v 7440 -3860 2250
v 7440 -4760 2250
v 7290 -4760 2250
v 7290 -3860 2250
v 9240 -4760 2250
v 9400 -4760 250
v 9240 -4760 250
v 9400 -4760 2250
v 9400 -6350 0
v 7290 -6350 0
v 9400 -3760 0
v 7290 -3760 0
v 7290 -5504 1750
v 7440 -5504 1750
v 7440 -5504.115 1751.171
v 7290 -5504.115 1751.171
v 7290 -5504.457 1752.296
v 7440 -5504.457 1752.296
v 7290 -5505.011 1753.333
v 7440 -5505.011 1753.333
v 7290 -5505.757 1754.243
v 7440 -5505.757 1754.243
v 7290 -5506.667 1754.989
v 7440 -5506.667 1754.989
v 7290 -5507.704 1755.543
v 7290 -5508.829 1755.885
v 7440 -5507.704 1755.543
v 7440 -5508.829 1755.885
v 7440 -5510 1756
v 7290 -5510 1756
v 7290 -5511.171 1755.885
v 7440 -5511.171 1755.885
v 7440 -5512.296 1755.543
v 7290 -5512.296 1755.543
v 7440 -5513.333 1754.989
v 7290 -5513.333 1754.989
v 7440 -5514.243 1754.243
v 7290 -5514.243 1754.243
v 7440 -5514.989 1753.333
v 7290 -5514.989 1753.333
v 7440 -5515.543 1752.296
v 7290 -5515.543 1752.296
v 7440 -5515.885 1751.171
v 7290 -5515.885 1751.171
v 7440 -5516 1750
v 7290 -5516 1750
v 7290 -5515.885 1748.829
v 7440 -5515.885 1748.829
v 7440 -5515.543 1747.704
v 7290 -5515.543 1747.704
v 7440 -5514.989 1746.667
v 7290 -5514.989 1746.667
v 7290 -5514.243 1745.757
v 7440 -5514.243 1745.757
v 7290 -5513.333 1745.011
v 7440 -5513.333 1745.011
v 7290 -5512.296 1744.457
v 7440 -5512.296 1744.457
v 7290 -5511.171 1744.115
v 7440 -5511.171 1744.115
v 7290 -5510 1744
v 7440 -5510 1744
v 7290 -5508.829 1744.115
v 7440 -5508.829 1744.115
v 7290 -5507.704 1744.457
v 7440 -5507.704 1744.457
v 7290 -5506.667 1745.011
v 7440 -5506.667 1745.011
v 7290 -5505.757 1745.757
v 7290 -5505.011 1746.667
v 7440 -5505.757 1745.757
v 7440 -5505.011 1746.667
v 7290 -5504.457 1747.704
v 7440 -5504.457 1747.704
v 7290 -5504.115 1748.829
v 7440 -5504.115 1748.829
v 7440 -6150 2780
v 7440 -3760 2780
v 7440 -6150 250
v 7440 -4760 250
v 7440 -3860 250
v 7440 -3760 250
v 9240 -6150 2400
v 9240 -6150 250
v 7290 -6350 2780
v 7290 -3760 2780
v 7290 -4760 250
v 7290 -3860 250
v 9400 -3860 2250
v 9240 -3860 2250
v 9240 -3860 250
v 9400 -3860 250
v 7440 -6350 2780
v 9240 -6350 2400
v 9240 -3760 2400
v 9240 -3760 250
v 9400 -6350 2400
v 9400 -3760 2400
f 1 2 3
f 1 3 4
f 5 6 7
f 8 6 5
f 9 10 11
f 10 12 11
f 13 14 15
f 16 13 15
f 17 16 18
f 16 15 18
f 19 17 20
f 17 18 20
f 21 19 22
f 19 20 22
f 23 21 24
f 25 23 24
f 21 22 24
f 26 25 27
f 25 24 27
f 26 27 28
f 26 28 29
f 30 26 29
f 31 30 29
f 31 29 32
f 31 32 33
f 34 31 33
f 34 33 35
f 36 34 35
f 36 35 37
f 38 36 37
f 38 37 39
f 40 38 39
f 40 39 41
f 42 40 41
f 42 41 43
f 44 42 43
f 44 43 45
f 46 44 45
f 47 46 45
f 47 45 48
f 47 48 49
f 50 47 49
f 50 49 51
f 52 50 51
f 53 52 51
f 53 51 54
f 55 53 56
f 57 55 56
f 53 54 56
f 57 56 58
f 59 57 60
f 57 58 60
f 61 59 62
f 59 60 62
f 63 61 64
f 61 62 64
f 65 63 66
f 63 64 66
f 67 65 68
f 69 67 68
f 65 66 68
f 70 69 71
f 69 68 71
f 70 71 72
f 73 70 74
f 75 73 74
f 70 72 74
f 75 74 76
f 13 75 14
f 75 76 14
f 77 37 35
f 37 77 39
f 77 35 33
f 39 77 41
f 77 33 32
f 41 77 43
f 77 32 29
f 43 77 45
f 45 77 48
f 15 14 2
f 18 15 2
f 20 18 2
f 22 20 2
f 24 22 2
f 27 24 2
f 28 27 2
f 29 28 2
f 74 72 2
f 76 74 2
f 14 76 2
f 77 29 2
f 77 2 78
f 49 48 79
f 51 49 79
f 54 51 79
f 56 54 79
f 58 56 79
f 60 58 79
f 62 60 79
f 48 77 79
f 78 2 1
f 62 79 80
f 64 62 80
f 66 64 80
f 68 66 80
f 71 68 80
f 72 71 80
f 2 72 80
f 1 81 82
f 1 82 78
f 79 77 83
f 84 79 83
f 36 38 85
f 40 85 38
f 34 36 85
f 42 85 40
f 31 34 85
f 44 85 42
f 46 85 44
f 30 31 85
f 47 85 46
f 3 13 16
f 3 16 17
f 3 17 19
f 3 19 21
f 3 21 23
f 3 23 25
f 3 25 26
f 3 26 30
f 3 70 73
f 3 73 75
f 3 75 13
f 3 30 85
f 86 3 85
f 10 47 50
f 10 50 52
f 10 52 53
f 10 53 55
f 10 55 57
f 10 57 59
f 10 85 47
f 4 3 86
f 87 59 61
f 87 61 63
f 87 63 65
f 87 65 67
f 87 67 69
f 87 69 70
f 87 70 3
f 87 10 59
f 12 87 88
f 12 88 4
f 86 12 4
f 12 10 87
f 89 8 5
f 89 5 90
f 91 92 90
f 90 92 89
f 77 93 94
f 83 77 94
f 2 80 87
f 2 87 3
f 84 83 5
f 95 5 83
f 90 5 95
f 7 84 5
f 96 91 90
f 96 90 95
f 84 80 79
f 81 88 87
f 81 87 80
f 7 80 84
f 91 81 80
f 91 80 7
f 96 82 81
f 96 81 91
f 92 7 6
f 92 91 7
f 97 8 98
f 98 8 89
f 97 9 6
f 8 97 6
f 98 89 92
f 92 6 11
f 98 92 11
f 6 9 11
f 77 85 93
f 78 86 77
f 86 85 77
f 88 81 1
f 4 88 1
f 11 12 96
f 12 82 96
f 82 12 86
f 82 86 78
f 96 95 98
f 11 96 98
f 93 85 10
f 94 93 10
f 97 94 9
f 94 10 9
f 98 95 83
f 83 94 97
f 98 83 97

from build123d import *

# Parameters (mm, degrees)
F0_W      = 2400
F0_H      = 1000
F1_DEPTH  = 250
F2_W      = 1800
F2_H      = 2390
F3_DEPTH  = 2320
F4_W      = 900
F4_H      = 2000
F5_DEPTH  = 9400.001
F6_W      = 1000
F6_H      = 1400
F6_W_2    = 900
F6_H_2    = 400
F7_DEPTH  = 6050
F8_W      = 920
F8_H      = 920
F8_W_2    = 1000
F9_DEPTH  = 200
F10_W     = 1000
F10_H     = 1500
F11_DEPTH = 200
F12_W     = 150
F12_H     = 2660
F13_DEPTH = 280
F15_DEPTH = 950
F17_DEPTH = 50
F19_DEPTH = 2320
F21_DEPTH = 3760.001
F22_R     = 30
F23_DEPTH = 250.001
F24_W     = 1020
F24_H     = 1020
F24_W_2   = 1100
F25_DEPTH = 50
F27_DEPTH = 2570.001
F28_W     = 2110
F28_H     = 2740
F28_W_2   = 1800
F28_H_2   = 2390
F29_DEPTH = 210
F31_DEPTH = 2740
F32_W     = 3974.900246
F32_H     = 3156.905889
F32_W_2   = 2110
F32_H_2   = 2590
F33_DEPTH = 2780.001
F34_R     = 6
F35_DEPTH = 300


with BuildPart() as f1:
    # F0 (on Top) → F1 (new body)
    with BuildSketch(Plane.XY):
        Polygon((10600, 0), (0, 0), (0, -6350), (9400, -6350), (9400, -5300), (10600, -5300), align=None)
        with Locations((5100, -5650)):
            Rectangle(F0_W, F0_H, mode=Mode.SUBTRACT)
    extrude(amount=F1_DEPTH)

    # F2 (on face) → F3 (join)
    with BuildSketch(Plane.XY.offset(250)):
        Polygon((10600, 0), (0, 0), (0, -6350), (9400, -6350), (9400, -3760), (10600, -3760), align=None)
        with Locations((8340, -4955)):
            Rectangle(F2_W, F2_H, mode=Mode.SUBTRACT)
        Polygon((200, -6150), (200, -200), (3750, -200), (3750, -300), (3900, -300), (3900, -280), (4800, -280), (4800, -1180), (4950, -1180), (4950, -400), (5250, -400), (5250, -200), (7290, -200), (7290, -300), (7440, -300), (10400, -300), (10400, -3610), (7440, -3610), (7440, -2960), (7290, -2960), (7290, -6150), (3900, -6150), (3900, -5050), (3750, -5050), (3750, -6150), align=None, mode=Mode.SUBTRACT)
    extrude(amount=F3_DEPTH)

    # F4 (on face) → F5 (cut, through all)
    with BuildSketch(Plane.YZ.offset(9400)):
        with Locations((-4310, 1250)):
            Rectangle(F4_W, F4_H)
    extrude(amount=-F5_DEPTH, mode=Mode.SUBTRACT)

    # F6 (on face) → F7 (cut, through all)
    with BuildSketch(Plane.XZ.offset(6350)):
        with Locations((6740, 1500)):
            Rectangle(F6_W, F6_H)
        with Locations((3100, 1500)):
            Rectangle(F6_W, F6_H)
        with Locations((9900, 2000)):
            Rectangle(F6_W_2, F6_H_2)
    extrude(amount=-F7_DEPTH, mode=Mode.SUBTRACT)

    # F8 (on face) → F9 (cut, through all)
    with BuildSketch(Plane(origin=(10400, 0, 0), x_dir=(0, -1, 0), z_dir=(-1, 0, 0))):
        with Locations((1140, 1640)):
            Rectangle(F8_W, F8_H)
        with Locations((2360, 1640)):
            Rectangle(F8_W_2, F8_H)
    extrude(amount=-F9_DEPTH, mode=Mode.SUBTRACT)

    # F10 (on face) → F11 (cut, through all)
    with BuildSketch(Plane.YZ.offset(200)):
        with Locations((-3160, 1500)):
            Rectangle(F10_W, F10_H)
        with Locations((-2060, 1500)):
            Rectangle(F10_W, F10_H)
        with Locations((-960, 1500)):
            Rectangle(F10_W, F10_H)
    extrude(amount=-F11_DEPTH, mode=Mode.SUBTRACT)

    # F12 (on face) → F13 (join)
    with BuildSketch(Plane.XY.offset(2570)):
        with Locations((7365, -1630)):
            Rectangle(F12_W, F12_H)
    extrude(amount=-F13_DEPTH)

    # F14 (on face) → F15 (join)
    with BuildSketch(Plane(origin=(0, -6150, 0), x_dir=(-1, 0, 0), z_dir=(0, 1, 0))):
        Polygon((-6350, 540), (-6350, 250), (-6300, 250), (-6300, 490), (-5995, 490), (-5995, 780), (-5690, 780), (-5690, 1070), (-5385, 1070), (-5385, 1360), (-5080, 1360), (-5080, 1650), (-4775, 1650), (-4775, 1940), (-4470, 1940), (-4470, 2230), (-4165, 2230), (-4165, 2520), (-3900, 2520), (-3900, 2570), (-4215, 2570), (-4215, 2280), (-4520, 2280), (-4520, 1990), (-4825, 1990), (-4825, 1700), (-5130, 1700), (-5130, 1410), (-5435, 1410), (-5435, 1120), (-5740, 1120), (-5740, 830), (-6045, 830), (-6045, 540), align=None)
    extrude(amount=F15_DEPTH)

    # F16 (on face) → F17 (join)
    with BuildSketch(Plane(origin=(0, -5200, 0), x_dir=(-1, 0, 0), z_dir=(0, 1, 0))):
        Polygon((-4215, 2570), (-6350, 540), (-6350, 250), (-6300, 250), (-4165, 2230), (-3900, 2475.761124), (-3900, 2570), align=None)
    extrude(amount=F17_DEPTH)

    # F18 (on face) → F19 (join)
    with BuildSketch(Plane.XY.offset(250)):
        with BuildLine():
            Line((6005, -5150), (6045, -5150))
            ThreePointArc((6045, -5150), (6048.535534, -5148.535534), (6050, -5145))
            Line((6050, -5145), (6050, -5105))
            ThreePointArc((6050, -5105), (6048.535534, -5101.464466), (6045, -5100))
            Line((6045, -5100), (6005, -5100))
            ThreePointArc((6005, -5100), (6001.464466, -5101.464466), (6000, -5105))
            Line((6000, -5105), (6000, -5145))
            ThreePointArc((6000, -5145), (6001.464466, -5148.535534), (6005, -5150))
        make_face()
        with BuildLine():
            Line((5705, -5150), (5745, -5150))
            ThreePointArc((5745, -5150), (5748.535534, -5148.535534), (5750, -5145))
            Line((5750, -5145), (5750, -5105))
            ThreePointArc((5750, -5105), (5748.535534, -5101.464466), (5745, -5100))
            Line((5745, -5100), (5705, -5100))
            ThreePointArc((5705, -5100), (5701.464466, -5101.464466), (5700, -5105))
            Line((5700, -5105), (5700, -5145))
            ThreePointArc((5700, -5145), (5701.464466, -5148.535534), (5705, -5150))
        make_face()
        with BuildLine():
            Line((5405, -5150), (5445, -5150))
            ThreePointArc((5445, -5150), (5448.535534, -5148.535534), (5450, -5145))
            Line((5450, -5145), (5450, -5105))
            ThreePointArc((5450, -5105), (5448.535534, -5101.464466), (5445, -5100))
            Line((5445, -5100), (5405, -5100))
            ThreePointArc((5405, -5100), (5401.464466, -5101.464466), (5400, -5105))
            Line((5400, -5105), (5400, -5145))
            ThreePointArc((5400, -5145), (5401.464466, -5148.535534), (5405, -5150))
        make_face()
        with BuildLine():
            Line((5105, -5150), (5145, -5150))
            ThreePointArc((5145, -5150), (5148.535534, -5148.535534), (5150, -5145))
            Line((5150, -5145), (5150, -5105))
            ThreePointArc((5150, -5105), (5148.535534, -5101.464466), (5145, -5100))
            Line((5145, -5100), (5105, -5100))
            ThreePointArc((5105, -5100), (5101.464466, -5101.464466), (5100, -5105))
            Line((5100, -5105), (5100, -5145))
            ThreePointArc((5100, -5145), (5101.464466, -5148.535534), (5105, -5150))
        make_face()
        with BuildLine():
            Line((4805, -5150), (4845, -5150))
            ThreePointArc((4845, -5150), (4848.535534, -5148.535534), (4850, -5145))
            Line((4850, -5145), (4850, -5105))
            ThreePointArc((4850, -5105), (4848.535534, -5101.464466), (4845, -5100))
            Line((4845, -5100), (4805, -5100))
            ThreePointArc((4805, -5100), (4801.464466, -5101.464466), (4800, -5105))
            Line((4800, -5105), (4800, -5145))
            ThreePointArc((4800, -5145), (4801.464466, -5148.535534), (4805, -5150))
        make_face()
        with BuildLine():
            Line((4505, -5150), (4545, -5150))
            ThreePointArc((4545, -5150), (4548.535534, -5148.535534), (4550, -5145))
            Line((4550, -5145), (4550, -5105))
            ThreePointArc((4550, -5105), (4548.535534, -5101.464466), (4545, -5100))
            Line((4545, -5100), (4505, -5100))
            ThreePointArc((4505, -5100), (4501.464466, -5101.464466), (4500, -5105))
            Line((4500, -5105), (4500, -5145))
            ThreePointArc((4500, -5145), (4501.464466, -5148.535534), (4505, -5150))
        make_face()
    extrude(amount=F19_DEPTH)

    # F20 (on face) → F21 (cut, through all)
    with BuildSketch(Plane.XZ.offset(3760)):
        Polygon((10600, 2570), (9400, 2570), (10400, 2350), (10600, 2350), align=None)
    extrude(amount=-F21_DEPTH, mode=Mode.SUBTRACT)

    # F22 (on face) → F23 (cut, through all)
    with BuildSketch(Plane.XY.offset(250)):
        with Locations((10300, -2510)):
            Circle(F22_R)
    extrude(amount=-F23_DEPTH, mode=Mode.SUBTRACT)

    # F24 (on face) → F25 (cut)
    with BuildSketch(Plane(origin=(10400, 0, 0), x_dir=(0, -1, 0), z_dir=(-1, 0, 0))):
        with Locations((1140, 1640)):
            Rectangle(F24_W, F24_H)
        with Locations((2360, 1640)):
            Rectangle(F24_W_2, F24_H)
    extrude(amount=-F25_DEPTH, mode=Mode.SUBTRACT)

    # F26 (on face) → F27 (cut, through all)
    with BuildSketch(Plane.XY.offset(2570)):
        Polygon((10725.590706, -3401.572847), (10725.590706, 0), (0, 0), (0, -6350), (6873.535156, -6350), (6873.535156, -3401.572847), align=None)
    extrude(amount=-F27_DEPTH, mode=Mode.SUBTRACT)

    # F28 (on face) → F29 (join)
    with BuildSketch(Plane.XY.offset(2570)):
        with Locations((8345, -4980)):
            Rectangle(F28_W, F28_H)
        with Locations((8340, -4955)):
            Rectangle(F28_W_2, F28_H_2, mode=Mode.SUBTRACT)
    extrude(amount=F29_DEPTH)

    # F30 (on face) → F31 (cut, through all)
    with BuildSketch(Plane.XZ.offset(6350)):
        Polygon((7440, 2780), (9240, 2400), (9400, 2400), (9400, 2780), align=None)
    extrude(amount=-F31_DEPTH, mode=Mode.SUBTRACT)

    # F32 (on face) → F33 (cut, through all)
    with BuildSketch(Plane.XY.offset(2780)):
        with Locations((8738.929272, -4872.399449)):
            Rectangle(F32_W, F32_H)
        with Locations((8345, -5055)):
            Rectangle(F32_W_2, F32_H_2, mode=Mode.SUBTRACT)
    extrude(amount=-F33_DEPTH, mode=Mode.SUBTRACT)

    # F34 (on face) → F35 (cut)
    with BuildSketch(Plane.YZ.offset(7440)):
        with Locations((-5510, 1750)):
            Circle(F34_R)
    extrude(amount=-F35_DEPTH, mode=Mode.SUBTRACT)


solid = f1.part
